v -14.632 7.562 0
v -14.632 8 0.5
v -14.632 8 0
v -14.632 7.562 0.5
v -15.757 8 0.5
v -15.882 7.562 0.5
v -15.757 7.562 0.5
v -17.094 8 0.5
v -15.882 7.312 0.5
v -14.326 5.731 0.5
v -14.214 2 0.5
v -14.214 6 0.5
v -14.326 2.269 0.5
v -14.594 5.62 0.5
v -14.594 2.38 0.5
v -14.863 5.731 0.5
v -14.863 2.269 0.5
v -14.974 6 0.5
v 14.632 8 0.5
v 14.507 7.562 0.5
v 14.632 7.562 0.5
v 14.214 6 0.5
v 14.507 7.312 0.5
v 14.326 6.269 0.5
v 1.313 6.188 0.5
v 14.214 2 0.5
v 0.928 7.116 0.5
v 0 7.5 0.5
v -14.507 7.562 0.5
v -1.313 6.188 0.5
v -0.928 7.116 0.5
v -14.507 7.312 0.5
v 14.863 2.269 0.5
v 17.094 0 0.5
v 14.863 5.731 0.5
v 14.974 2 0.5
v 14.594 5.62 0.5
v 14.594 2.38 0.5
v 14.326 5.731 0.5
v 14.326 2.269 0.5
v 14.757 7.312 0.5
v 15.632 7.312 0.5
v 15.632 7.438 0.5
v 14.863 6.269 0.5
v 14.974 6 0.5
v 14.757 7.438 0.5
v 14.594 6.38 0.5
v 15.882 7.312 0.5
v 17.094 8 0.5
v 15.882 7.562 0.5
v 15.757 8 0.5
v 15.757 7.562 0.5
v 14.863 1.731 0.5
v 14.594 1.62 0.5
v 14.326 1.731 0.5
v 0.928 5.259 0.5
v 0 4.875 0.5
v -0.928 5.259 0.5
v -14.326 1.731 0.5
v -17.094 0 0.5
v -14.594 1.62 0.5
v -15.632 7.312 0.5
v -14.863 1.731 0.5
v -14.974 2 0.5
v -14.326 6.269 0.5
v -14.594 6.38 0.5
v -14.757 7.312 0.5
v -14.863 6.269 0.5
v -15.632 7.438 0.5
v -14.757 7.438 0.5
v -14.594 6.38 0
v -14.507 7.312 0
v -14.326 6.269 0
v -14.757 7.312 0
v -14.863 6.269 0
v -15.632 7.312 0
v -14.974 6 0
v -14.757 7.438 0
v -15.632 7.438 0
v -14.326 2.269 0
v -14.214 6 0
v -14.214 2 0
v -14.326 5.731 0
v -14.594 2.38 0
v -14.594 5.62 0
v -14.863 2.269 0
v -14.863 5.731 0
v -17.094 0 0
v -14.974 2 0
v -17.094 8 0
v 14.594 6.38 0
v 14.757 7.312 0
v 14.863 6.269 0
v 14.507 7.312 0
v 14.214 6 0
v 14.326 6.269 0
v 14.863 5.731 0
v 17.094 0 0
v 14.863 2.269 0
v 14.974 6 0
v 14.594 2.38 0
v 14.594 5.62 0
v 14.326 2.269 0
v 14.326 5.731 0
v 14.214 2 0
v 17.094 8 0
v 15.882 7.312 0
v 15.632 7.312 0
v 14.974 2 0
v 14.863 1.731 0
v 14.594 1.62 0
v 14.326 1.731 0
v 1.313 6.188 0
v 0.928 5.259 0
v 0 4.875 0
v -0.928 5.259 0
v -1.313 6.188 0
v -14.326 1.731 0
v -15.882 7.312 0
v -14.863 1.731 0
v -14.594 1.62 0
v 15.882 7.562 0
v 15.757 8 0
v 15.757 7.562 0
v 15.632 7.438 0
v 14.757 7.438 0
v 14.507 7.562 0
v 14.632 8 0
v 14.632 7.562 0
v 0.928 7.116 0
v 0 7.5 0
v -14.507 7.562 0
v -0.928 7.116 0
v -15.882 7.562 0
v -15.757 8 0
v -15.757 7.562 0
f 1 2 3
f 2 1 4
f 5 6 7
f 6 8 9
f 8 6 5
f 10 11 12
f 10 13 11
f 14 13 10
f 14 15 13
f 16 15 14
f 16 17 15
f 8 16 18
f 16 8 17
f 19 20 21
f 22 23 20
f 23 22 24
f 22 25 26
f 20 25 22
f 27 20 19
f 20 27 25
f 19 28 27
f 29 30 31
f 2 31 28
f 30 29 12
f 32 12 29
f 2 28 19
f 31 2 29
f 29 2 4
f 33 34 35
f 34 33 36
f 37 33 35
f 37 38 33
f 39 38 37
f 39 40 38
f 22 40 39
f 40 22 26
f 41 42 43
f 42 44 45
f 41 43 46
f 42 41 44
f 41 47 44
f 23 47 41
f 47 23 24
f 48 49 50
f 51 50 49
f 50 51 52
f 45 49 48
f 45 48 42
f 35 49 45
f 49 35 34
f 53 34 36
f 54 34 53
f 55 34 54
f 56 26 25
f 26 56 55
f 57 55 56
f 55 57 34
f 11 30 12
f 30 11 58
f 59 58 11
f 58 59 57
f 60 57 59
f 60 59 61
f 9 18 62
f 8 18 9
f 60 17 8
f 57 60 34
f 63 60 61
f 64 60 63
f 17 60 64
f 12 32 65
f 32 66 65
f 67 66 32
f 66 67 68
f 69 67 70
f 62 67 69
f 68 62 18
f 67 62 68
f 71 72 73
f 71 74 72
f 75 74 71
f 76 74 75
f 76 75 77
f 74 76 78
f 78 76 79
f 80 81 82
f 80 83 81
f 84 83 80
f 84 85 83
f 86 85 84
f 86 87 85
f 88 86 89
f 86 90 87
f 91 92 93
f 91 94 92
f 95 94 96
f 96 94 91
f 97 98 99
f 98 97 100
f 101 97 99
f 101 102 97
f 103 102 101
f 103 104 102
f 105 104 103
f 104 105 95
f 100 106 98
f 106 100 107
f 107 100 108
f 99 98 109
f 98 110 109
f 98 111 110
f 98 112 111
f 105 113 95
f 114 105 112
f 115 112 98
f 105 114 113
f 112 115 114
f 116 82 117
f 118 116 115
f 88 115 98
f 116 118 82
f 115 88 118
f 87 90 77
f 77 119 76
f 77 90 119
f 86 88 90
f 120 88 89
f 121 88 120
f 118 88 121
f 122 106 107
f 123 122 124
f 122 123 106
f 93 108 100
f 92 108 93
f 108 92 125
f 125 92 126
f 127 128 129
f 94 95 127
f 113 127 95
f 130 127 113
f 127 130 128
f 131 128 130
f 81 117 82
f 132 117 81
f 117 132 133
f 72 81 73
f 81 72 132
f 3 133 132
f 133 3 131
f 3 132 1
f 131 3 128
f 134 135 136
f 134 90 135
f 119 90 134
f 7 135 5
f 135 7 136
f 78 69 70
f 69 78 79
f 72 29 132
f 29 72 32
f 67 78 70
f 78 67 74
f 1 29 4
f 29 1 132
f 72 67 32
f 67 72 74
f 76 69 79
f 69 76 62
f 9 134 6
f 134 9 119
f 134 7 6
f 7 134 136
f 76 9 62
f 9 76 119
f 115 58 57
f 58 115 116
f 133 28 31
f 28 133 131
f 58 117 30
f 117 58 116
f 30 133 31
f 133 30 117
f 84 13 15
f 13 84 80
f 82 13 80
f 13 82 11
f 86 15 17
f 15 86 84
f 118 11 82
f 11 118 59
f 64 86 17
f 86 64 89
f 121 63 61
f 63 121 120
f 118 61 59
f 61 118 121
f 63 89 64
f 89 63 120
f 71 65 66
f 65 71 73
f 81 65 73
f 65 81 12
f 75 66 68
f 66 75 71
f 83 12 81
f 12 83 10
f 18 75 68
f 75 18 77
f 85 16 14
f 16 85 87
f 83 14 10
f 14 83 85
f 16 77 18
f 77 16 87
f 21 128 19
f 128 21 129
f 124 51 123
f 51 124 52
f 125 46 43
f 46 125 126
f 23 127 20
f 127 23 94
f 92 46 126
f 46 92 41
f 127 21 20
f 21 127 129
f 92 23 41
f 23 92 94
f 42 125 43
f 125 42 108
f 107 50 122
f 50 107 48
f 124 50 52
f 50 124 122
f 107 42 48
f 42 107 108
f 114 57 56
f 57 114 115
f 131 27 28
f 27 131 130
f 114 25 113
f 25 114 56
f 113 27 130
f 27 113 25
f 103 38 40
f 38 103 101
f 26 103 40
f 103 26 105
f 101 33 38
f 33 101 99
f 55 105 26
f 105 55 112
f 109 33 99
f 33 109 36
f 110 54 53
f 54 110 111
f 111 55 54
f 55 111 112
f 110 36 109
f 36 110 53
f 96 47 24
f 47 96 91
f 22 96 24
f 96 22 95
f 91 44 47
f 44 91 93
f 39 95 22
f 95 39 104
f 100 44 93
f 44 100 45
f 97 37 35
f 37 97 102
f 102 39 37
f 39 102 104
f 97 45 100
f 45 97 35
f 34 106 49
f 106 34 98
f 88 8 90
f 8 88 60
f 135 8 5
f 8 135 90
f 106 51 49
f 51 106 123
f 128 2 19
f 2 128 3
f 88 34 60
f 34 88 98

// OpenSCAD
// file: modus.scad
//Corner Joint - allows the sides of two parts to create inlayed corner. Aids with welding.
//need to verify module math is the same throughout all parts.

module cornerjoint(Z,L,H,EndGap,PadL,PadH,CJangle,CJcenter){
    //change so that H = Z of inlayed part (usually 0.5)
    //add center and angle in degrees option, orgin far side of cut out area

     if((CJangle==0)&&(CJcenter==0))
      {    
        translate([0,0,0])
        rotate([0,0,CJangle])
        difference(){
        cube([L,H+PadH,Z]);
        translate([EndGap,H,0])
        cube([PadL,PadH,Z]);
        translate([L-EndGap-PadL,H,0])
        cube([PadL,PadH,Z]);}
      }    
else if((CJangle==90)&&(CJcenter==0))
      {    
        translate([H+PadH,0,0])
        rotate([0,0,CJangle])
        difference(){
        cube([L,H+PadH,Z]);
        translate([EndGap,H,0])
        cube([PadL,PadH,Z]);
        translate([L-EndGap-PadL,H,0])
        cube([PadL,PadH,Z]);}
      }
else if((CJangle==180)&&(CJcenter==0))       
      {    
        translate([L,H+PadH,0])
        rotate([0,0,CJangle])
        difference(){
        cube([L,H+PadH,Z]);
        translate([EndGap,H,0])
        cube([PadL,PadH,Z]);
        translate([L-EndGap-PadL,H,0])
        cube([PadL,PadH,Z]);}
      }
else if((CJangle==270)&&(CJcenter==0))
      {    
        translate([0,L,0])
        rotate([0,0,CJangle])
        difference(){
        cube([L,H+PadH,Z]);
        translate([EndGap,H,0])
        cube([PadL,PadH,Z]);
        translate([L-EndGap-PadL,H,0])
        cube([PadL,PadH,Z]);}
      }  
      
//centered     
   
else if((CJangle==0)&&(CJcenter==1))
      {    
        translate([-L/2,0,0])
        rotate([0,0,CJangle])
        difference(){
        cube([L,H+PadH,Z]);
        translate([EndGap,H,0])
        cube([PadL,PadH,Z]);
        translate([L-EndGap-PadL,H,0])
        cube([PadL,PadH,Z]);}
      }  
else if((CJangle==90)&&(CJcenter==1))
      {    
        translate([0,-L/2,0])
        rotate([0,0,CJangle])
        difference(){
        cube([L,H+PadH,Z]);
        translate([EndGap,H,0])
        cube([PadL,PadH,Z]);
        translate([L-EndGap-PadL,H,0])
        cube([PadL,PadH,Z]);}
      }
else if((CJangle==180)&&(CJcenter==1))       
      {    
        translate([L/2,0,0])
        rotate([0,0,CJangle])
        difference(){
        cube([L,H+PadH,Z]);
        translate([EndGap,H,0])
        cube([PadL,PadH,Z]);
        translate([L-EndGap-PadL,H,0])
        cube([PadL,PadH,Z]);}
      }
else if((CJangle==270)&&(CJcenter==1))
      {    
        translate([0,L/2,0])
        rotate([0,0,CJangle])
        difference(){
        cube([L,H+PadH,Z]);
        translate([EndGap,H,0])
        cube([PadL,PadH,Z]);
        translate([L-EndGap-PadL,H,0])
        cube([PadL,PadH,Z]);}
      }
} //end cornerjoint module

//Tab Insert - used to cut a hole for an abutting part to insert into. Typically aids with welding the two parts.
module tabinsert(X,Y,Z,dGap,cGap,c1,c2,c3,c4,c5,c6,c7,c8,center){
    translate([-dGap-(center*(X/2)),-dGap-(center*(Y/2)),0]){
        //main cut
        cube([X+(dGap*2),Y+(dGap*2),Z]);
        //corner c1c2
        translate([-cGap,(Y+(dGap*2))-c1+cGap,0])
            {
        cube([c2,c1,Z]);}
       //corner c3c4
       translate([(X+(dGap*2))-c3+cGap,(Y+(dGap*2))-c4+cGap,0]){
           cube([c3,c4,Z]);
       }
       //corner c5c6
       translate([(X+(dGap*2))-c6+cGap,-cGap,0])
      {
          cube([c6,c5,Z]);
      }
       
       //corner c7c8 
       translate([-cGap,-cGap,0]){
           cube([c7,c8,Z]);
       }
    
    } //end center translate
} //end tabinsert module
 

module nut(flattoflat,nutheight){  //distance from one flat side to the other flat side "A/F"

//typical sizes found here:
//https://en.wikipedia.org/wiki/Nut_(hardware)

difference(){
    translate([0,0,nutheight/2])
cube(size = [10,10,nutheight], center = true);
    
for(i=[1:6]){
    rotate([0,0,i*60])
difference(){
    translate([-10,0,0])
    cube([20,20,nutheight]);
    translate([-10,0,0])
    cube([20,flattoflat/2,nutheight]);
}  //end difference
}  //end for
}  //end differeence
}  //end module
// file: vars.scad
brickW=6; 
brickL=24;
brickCH=6; //Is brick height being shortened by d1z??

//3.625 x 2.25 x 8
//6 x 12 x 6

grateX=56;
grateY=23;
grateH=37; //Height mounted above press's frame
grateA=17.5; //angle of grate

//grateX=56;
//grateY=23;
//grateH=37; //Height mounted above press's frame
//grateA=17.5; //angle of grate


$fn=8; //defines resolution of circles. 8 is okay for review. 100  or greater should be used for for final dxf export.

dZstandard=0.5; //thickness of steel to be cut for drawer parts
fZstandard=0.5;
aZstandard=0.5; //thickness of steel to be cut for arm parts
hZstandard=0.125;

fBOLTHOLEstandardD=1; //standard bolts used on frame
aBOLTHOLEstandardD=1;

sliderodholeOD=1.2; 
d1bushingOD=1.25;
d1bushingL=1.25;
d1shaftOD=1;
d1bolt1OD=1;
d1bolt2OD=0.75;
d1nut2AF=1.25;
d1nut2H=0.665;


dGap=0.03125; //gap between a hole cut's edge and the part sitting within the hole. //D3 appears to use 0.3125, is this in error?

//all parts set to standard thickness below
//off standard preferences can be defined below

//drawer
drawergap=0.0283;  //extra room for drawer to slide in the space between f1 and f4
drawerHgap=0.1884;  //total extra space from drawer sides to frame walls. sum of both sides.

d2clevispinaccessholeOD=3;

d1z=dZstandard;
d2z=dZstandard;
d3z=dZstandard;
d4z=dZstandard;
d5z=dZstandard;
d6z=dZstandard;
d5z=dZstandard;
d7z=dZstandard;
d8z=dZstandard;
d9z=dZstandard;

d11z=dZstandard;
d12z=dZstandard;


//frame

f1y=6;
f1z=fZstandard;


f2y=3.5;
f2z=fZstandard;

f3y=3.5;
f3z=fZstandard;

f4y=11;
f4z=fZstandard;

f5y=3.5;
f5z=fZstandard;

f6y=8;
f6z=fZstandard;

f8y=brickW;
f8z=fZstandard;
f8boltD=1;

f9y=4.5;

f9z=fZstandard;




f12z=fZstandard;   

f11x=1.25;
f11z=fZstandard;

f13z=fZstandard;

f14y=3.5;
f14z=fZstandard;

//arms

a1x=4;
a1z=aZstandard;
a1out=24; //length from frame to A5 edge for bricks to sit on as they exit

a2x=6;
a2z=aZstandard;

a3x=4;
a3y=72;
a3z=aZstandard;

a4x=6;
a4y=72;
a4z=aZstandard;

a5x=6;
a5y=72;
a5z=aZstandard;

a6z=aZstandard;

//guards

h1x=grateX;
h1y=grateH;  //might need to tweak for grate thickness

h1z=hZstandard;
h2z=hZstandard;
h3z=hZstandard;
h4z=hZstandard;
h5z=hZstandard;
h6z=hZstandard;
h7z=hZstandard;
h8z=hZstandard;

//
//Input your main cylinder's dimenions here
//
cylMainBore = 5;
cylMainStroke = 16;
cylMainExt = 43;
cylMainRet = 27;
cylMainA = (cylMainRet-cylMainStroke); //center to center minus stroke length
cylMainB = 0.25; // cylinder wall thickness
cylMainD = 2.5; //Rod OD
cylMainE = 5.75; //rear pin holder width
cylMainG = 4; //rod pin holder width
cylMainJ = 3.8; //distance from the end of the cylinder body to rod pin center
cylMainR = 1.52; //pin hole ID
cylMainS = 2.5; //pin holder OD

//
//Input your drawer cylinder's dimenions here
//
//
cylDrawerBore = 5;
cylDrawerStroke = 16;
cylDrawerExt = 43;
cylDrawerRet = 27;
cylDrawerA = (cylMainRet-cylMainStroke); //center to center minus stroke length
cylDrawerB = 0.25; // cylinder wall thickness
cylDrawerD = 2.5; //Rod OD
cylDrawerE = 5.75; //rear pin holder width
cylDrawerG = 4; //rod pin holder width
cylDrawerJ = 3.8; //distance from the end of the cylinder body to rod pin center
cylDrawerR = 1.52; //pin hole ID
cylDrawerS = 2.5; //pin holder OD

cylinderDRAWERbodyH=3; //measured when in position, largest length from top to bottom of cylinder
cylinderDRAWERminC2C=0; //drawer's hydraulic cylinder's distance from the center of one mounting hole to the center of the other when fully compressed.
cylinderDRAWERmaxC2C=0; ///drawer's hydraulic cylinder's distance from the center of one mounting hole to the center of the other when fully extended.
cylinderDRAWERrodclevisW=2.5; //width of cylinders' clevis on end of rod
cylinderDRAWERrodclevisID=1;
cylinderDRAWERrodclevisOD=2;
cylinderDRAWERrearclevisW=2.5; //width of mounting clevis cylinder body
cylinderDRAWERrearclevisID=1;
cylinderDRAWERrearclevisOD=2;
cylinderDRAWERrearclevisClearance=3; //usable space around rear clevis pin (in diameter). be aware of hyraulic fittings.

//the following variables are calculated in order of dependence on preceding variables

d3x=brickL+(d2z*2);
d3y=brickCH-d1z;
d4x=brickW+d3z+d3z;
d4y=brickCH-d1z;
d5x=brickL+(d2z*2);
d5y=brickW;
d6x=brickL+(d2z*2);
d6y=brickCH;
d7x=cylinderDRAWERrearclevisClearance;
d7y=a4z+d8z+cylinderDRAWERbodyH;
d9x=cylinderDRAWERbodyH+d6z; //should be based on clevis size?
d9y=cylinderDRAWERbodyH+d8z;
d8x=brickL+(d2z*2);
d8y=max(5,(d9x-d6z));   //need to review fundamentals, 5 minimun unless d9 gets larger than d8
d11x=1.5+(d1bolt1OD*2)+d1bushingOD;
d11y=max((0.5+d1bushingL),4);

d12x=d8x;
d12y=d11y+1;

f1x=((brickL+(d2z*2)+drawerHgap+(f9y*2)));
f3x=f1x;

d1x=(brickL+d2z+d2z);
//d1x=(((f1x/2)-(((brickL+(d2z*2)+drawerHgap)/2)-fZstandard-(sliderodholeOD/2)))+(d11x/2))*2;
d1y=((brickW+d3z+d3z)*3)+1;

d2x=d8y+d6z+brickW+d3z+d5y+d3z;
d2y=brickCH;



f11y=f8y;
f6x=brickL+(d2z*2)+(f9y*2)+drawerHgap;

f9x=(f2z+((cylMainS+0.125)/2)+cylMainRet-cylMainJ+1+f4y+drawergap+d2y+f1y);  //leaves 1" between top of cylinder and bottom of F4
f8x=f9x;


f2x=brickL+(d2z*2)+drawerHgap+(f9y*2)-(1.4*2);  //distance between large cut outs in f9

f5x=brickL+(d2z*2)+drawerHgap+(f9y*2)+(a1x*2); //distance between outer edges of each A1

f4x=f5x-0.5;   //same as f5 but minus 0.25 on each side to give a little overhang

f14x=brickL+(1*2)+(.125*2)+(dGap*2); 

f12x=f3x;
f12y=(f3y*2)+brickW;

sliderodoffset=(((brickL+(d2z*2)+drawerHgap)/2)-fZstandard-(sliderodholeOD/2));

distancetof8center=(cylDrawerExt+(a4x/2)+((d9x-d6z)/2)+d6z+(brickW/2)); //F8 center on A1

a1y=distancetof8center+(brickW/2)+a1out;
a2y=a1y;

h7x=f5x-((a1x/2)*2)+(1.5*2);
h7y=cylDrawerStroke;

h8x=f5x-((a1x/2)*2)+(1.5*2);
h8y=a1out-a5x-f5y;  //distance between a5 and f5

hopperBaseX=brickL;
hopperBaseY=brickW;

h2x=grateX;
h2y=sqrt(((h1y-(sin(grateA)*grateY))*(h1y-(sin(grateA)*grateY)))+(((cos(grateA)*grateY)-hopperBaseY)*((cos(grateA)*grateY)-hopperBaseY)));

//h1y-(sin(grateA)*grateY)
//(cos(grateA)*grateY)-hopperBaseY

echo(h1y-(sin(grateA)*grateY));
echo((cos(grateA)*grateY)-hopperBaseY);
echo(h2y);
echo(atan((h1y-(sin(grateA)*grateY))/((cos(grateA)*grateY)-hopperBaseY)));
echo((h1y-(sin(grateA)*grateY))/(h1y));

// ECHO - REQUIRED PARTS BASED ON INPUTS

echo(str("Minimum drawer cylinder stroke length: ",(d3z*2)+d5y+brickW));
//would be cool to validate and confirm user inputed stroke length. set error=1; if drawer cylinder is not long enough. print an echo warning.

echo(str("Grate hieght above ground level: ",(1)));
// main file
include <vars.scad>;
use <modus.scad>;

f6p();

module f6p(){

difference(){
translate([-(f6x/2),0,0])
cube([f6x,f6y,f6z]);
translate([-(f6x/2),0,0])
cuts();
translate([(f6x/2),0,0])
mirror([1,0,0])
cuts();
} //end difference
module cuts(){
    
    translate([(f6x-f2x)/2,f6y-f2z,0])
        tabinsert(1,f2z,f6z,0.0625,0.125,0,0,0,0,0.25,0.25,0.25,0.25,0);    //F2
    
//need to change this section to match MAINcylinder specs
    translate([f6x/2,f6y-f2z-((cylMainS+0.125)/2),0])
        cylinder(h = f6z, r = (cylMainS+0.125)/2);
    
    // bolt holes to f9
    translate([((f6x-brickL-(d2z*2)-drawerHgap)/2)-2,2,0])
        cylinder(h = f6z, r = 0.38); //diameter 0.76?
    translate([((f6x-brickL-(d2z*2)-drawerHgap)/2)-2,6,0])
        cylinder(h = f6z, r = 0.38);
    
} //end cuts module
} //end f6p module
